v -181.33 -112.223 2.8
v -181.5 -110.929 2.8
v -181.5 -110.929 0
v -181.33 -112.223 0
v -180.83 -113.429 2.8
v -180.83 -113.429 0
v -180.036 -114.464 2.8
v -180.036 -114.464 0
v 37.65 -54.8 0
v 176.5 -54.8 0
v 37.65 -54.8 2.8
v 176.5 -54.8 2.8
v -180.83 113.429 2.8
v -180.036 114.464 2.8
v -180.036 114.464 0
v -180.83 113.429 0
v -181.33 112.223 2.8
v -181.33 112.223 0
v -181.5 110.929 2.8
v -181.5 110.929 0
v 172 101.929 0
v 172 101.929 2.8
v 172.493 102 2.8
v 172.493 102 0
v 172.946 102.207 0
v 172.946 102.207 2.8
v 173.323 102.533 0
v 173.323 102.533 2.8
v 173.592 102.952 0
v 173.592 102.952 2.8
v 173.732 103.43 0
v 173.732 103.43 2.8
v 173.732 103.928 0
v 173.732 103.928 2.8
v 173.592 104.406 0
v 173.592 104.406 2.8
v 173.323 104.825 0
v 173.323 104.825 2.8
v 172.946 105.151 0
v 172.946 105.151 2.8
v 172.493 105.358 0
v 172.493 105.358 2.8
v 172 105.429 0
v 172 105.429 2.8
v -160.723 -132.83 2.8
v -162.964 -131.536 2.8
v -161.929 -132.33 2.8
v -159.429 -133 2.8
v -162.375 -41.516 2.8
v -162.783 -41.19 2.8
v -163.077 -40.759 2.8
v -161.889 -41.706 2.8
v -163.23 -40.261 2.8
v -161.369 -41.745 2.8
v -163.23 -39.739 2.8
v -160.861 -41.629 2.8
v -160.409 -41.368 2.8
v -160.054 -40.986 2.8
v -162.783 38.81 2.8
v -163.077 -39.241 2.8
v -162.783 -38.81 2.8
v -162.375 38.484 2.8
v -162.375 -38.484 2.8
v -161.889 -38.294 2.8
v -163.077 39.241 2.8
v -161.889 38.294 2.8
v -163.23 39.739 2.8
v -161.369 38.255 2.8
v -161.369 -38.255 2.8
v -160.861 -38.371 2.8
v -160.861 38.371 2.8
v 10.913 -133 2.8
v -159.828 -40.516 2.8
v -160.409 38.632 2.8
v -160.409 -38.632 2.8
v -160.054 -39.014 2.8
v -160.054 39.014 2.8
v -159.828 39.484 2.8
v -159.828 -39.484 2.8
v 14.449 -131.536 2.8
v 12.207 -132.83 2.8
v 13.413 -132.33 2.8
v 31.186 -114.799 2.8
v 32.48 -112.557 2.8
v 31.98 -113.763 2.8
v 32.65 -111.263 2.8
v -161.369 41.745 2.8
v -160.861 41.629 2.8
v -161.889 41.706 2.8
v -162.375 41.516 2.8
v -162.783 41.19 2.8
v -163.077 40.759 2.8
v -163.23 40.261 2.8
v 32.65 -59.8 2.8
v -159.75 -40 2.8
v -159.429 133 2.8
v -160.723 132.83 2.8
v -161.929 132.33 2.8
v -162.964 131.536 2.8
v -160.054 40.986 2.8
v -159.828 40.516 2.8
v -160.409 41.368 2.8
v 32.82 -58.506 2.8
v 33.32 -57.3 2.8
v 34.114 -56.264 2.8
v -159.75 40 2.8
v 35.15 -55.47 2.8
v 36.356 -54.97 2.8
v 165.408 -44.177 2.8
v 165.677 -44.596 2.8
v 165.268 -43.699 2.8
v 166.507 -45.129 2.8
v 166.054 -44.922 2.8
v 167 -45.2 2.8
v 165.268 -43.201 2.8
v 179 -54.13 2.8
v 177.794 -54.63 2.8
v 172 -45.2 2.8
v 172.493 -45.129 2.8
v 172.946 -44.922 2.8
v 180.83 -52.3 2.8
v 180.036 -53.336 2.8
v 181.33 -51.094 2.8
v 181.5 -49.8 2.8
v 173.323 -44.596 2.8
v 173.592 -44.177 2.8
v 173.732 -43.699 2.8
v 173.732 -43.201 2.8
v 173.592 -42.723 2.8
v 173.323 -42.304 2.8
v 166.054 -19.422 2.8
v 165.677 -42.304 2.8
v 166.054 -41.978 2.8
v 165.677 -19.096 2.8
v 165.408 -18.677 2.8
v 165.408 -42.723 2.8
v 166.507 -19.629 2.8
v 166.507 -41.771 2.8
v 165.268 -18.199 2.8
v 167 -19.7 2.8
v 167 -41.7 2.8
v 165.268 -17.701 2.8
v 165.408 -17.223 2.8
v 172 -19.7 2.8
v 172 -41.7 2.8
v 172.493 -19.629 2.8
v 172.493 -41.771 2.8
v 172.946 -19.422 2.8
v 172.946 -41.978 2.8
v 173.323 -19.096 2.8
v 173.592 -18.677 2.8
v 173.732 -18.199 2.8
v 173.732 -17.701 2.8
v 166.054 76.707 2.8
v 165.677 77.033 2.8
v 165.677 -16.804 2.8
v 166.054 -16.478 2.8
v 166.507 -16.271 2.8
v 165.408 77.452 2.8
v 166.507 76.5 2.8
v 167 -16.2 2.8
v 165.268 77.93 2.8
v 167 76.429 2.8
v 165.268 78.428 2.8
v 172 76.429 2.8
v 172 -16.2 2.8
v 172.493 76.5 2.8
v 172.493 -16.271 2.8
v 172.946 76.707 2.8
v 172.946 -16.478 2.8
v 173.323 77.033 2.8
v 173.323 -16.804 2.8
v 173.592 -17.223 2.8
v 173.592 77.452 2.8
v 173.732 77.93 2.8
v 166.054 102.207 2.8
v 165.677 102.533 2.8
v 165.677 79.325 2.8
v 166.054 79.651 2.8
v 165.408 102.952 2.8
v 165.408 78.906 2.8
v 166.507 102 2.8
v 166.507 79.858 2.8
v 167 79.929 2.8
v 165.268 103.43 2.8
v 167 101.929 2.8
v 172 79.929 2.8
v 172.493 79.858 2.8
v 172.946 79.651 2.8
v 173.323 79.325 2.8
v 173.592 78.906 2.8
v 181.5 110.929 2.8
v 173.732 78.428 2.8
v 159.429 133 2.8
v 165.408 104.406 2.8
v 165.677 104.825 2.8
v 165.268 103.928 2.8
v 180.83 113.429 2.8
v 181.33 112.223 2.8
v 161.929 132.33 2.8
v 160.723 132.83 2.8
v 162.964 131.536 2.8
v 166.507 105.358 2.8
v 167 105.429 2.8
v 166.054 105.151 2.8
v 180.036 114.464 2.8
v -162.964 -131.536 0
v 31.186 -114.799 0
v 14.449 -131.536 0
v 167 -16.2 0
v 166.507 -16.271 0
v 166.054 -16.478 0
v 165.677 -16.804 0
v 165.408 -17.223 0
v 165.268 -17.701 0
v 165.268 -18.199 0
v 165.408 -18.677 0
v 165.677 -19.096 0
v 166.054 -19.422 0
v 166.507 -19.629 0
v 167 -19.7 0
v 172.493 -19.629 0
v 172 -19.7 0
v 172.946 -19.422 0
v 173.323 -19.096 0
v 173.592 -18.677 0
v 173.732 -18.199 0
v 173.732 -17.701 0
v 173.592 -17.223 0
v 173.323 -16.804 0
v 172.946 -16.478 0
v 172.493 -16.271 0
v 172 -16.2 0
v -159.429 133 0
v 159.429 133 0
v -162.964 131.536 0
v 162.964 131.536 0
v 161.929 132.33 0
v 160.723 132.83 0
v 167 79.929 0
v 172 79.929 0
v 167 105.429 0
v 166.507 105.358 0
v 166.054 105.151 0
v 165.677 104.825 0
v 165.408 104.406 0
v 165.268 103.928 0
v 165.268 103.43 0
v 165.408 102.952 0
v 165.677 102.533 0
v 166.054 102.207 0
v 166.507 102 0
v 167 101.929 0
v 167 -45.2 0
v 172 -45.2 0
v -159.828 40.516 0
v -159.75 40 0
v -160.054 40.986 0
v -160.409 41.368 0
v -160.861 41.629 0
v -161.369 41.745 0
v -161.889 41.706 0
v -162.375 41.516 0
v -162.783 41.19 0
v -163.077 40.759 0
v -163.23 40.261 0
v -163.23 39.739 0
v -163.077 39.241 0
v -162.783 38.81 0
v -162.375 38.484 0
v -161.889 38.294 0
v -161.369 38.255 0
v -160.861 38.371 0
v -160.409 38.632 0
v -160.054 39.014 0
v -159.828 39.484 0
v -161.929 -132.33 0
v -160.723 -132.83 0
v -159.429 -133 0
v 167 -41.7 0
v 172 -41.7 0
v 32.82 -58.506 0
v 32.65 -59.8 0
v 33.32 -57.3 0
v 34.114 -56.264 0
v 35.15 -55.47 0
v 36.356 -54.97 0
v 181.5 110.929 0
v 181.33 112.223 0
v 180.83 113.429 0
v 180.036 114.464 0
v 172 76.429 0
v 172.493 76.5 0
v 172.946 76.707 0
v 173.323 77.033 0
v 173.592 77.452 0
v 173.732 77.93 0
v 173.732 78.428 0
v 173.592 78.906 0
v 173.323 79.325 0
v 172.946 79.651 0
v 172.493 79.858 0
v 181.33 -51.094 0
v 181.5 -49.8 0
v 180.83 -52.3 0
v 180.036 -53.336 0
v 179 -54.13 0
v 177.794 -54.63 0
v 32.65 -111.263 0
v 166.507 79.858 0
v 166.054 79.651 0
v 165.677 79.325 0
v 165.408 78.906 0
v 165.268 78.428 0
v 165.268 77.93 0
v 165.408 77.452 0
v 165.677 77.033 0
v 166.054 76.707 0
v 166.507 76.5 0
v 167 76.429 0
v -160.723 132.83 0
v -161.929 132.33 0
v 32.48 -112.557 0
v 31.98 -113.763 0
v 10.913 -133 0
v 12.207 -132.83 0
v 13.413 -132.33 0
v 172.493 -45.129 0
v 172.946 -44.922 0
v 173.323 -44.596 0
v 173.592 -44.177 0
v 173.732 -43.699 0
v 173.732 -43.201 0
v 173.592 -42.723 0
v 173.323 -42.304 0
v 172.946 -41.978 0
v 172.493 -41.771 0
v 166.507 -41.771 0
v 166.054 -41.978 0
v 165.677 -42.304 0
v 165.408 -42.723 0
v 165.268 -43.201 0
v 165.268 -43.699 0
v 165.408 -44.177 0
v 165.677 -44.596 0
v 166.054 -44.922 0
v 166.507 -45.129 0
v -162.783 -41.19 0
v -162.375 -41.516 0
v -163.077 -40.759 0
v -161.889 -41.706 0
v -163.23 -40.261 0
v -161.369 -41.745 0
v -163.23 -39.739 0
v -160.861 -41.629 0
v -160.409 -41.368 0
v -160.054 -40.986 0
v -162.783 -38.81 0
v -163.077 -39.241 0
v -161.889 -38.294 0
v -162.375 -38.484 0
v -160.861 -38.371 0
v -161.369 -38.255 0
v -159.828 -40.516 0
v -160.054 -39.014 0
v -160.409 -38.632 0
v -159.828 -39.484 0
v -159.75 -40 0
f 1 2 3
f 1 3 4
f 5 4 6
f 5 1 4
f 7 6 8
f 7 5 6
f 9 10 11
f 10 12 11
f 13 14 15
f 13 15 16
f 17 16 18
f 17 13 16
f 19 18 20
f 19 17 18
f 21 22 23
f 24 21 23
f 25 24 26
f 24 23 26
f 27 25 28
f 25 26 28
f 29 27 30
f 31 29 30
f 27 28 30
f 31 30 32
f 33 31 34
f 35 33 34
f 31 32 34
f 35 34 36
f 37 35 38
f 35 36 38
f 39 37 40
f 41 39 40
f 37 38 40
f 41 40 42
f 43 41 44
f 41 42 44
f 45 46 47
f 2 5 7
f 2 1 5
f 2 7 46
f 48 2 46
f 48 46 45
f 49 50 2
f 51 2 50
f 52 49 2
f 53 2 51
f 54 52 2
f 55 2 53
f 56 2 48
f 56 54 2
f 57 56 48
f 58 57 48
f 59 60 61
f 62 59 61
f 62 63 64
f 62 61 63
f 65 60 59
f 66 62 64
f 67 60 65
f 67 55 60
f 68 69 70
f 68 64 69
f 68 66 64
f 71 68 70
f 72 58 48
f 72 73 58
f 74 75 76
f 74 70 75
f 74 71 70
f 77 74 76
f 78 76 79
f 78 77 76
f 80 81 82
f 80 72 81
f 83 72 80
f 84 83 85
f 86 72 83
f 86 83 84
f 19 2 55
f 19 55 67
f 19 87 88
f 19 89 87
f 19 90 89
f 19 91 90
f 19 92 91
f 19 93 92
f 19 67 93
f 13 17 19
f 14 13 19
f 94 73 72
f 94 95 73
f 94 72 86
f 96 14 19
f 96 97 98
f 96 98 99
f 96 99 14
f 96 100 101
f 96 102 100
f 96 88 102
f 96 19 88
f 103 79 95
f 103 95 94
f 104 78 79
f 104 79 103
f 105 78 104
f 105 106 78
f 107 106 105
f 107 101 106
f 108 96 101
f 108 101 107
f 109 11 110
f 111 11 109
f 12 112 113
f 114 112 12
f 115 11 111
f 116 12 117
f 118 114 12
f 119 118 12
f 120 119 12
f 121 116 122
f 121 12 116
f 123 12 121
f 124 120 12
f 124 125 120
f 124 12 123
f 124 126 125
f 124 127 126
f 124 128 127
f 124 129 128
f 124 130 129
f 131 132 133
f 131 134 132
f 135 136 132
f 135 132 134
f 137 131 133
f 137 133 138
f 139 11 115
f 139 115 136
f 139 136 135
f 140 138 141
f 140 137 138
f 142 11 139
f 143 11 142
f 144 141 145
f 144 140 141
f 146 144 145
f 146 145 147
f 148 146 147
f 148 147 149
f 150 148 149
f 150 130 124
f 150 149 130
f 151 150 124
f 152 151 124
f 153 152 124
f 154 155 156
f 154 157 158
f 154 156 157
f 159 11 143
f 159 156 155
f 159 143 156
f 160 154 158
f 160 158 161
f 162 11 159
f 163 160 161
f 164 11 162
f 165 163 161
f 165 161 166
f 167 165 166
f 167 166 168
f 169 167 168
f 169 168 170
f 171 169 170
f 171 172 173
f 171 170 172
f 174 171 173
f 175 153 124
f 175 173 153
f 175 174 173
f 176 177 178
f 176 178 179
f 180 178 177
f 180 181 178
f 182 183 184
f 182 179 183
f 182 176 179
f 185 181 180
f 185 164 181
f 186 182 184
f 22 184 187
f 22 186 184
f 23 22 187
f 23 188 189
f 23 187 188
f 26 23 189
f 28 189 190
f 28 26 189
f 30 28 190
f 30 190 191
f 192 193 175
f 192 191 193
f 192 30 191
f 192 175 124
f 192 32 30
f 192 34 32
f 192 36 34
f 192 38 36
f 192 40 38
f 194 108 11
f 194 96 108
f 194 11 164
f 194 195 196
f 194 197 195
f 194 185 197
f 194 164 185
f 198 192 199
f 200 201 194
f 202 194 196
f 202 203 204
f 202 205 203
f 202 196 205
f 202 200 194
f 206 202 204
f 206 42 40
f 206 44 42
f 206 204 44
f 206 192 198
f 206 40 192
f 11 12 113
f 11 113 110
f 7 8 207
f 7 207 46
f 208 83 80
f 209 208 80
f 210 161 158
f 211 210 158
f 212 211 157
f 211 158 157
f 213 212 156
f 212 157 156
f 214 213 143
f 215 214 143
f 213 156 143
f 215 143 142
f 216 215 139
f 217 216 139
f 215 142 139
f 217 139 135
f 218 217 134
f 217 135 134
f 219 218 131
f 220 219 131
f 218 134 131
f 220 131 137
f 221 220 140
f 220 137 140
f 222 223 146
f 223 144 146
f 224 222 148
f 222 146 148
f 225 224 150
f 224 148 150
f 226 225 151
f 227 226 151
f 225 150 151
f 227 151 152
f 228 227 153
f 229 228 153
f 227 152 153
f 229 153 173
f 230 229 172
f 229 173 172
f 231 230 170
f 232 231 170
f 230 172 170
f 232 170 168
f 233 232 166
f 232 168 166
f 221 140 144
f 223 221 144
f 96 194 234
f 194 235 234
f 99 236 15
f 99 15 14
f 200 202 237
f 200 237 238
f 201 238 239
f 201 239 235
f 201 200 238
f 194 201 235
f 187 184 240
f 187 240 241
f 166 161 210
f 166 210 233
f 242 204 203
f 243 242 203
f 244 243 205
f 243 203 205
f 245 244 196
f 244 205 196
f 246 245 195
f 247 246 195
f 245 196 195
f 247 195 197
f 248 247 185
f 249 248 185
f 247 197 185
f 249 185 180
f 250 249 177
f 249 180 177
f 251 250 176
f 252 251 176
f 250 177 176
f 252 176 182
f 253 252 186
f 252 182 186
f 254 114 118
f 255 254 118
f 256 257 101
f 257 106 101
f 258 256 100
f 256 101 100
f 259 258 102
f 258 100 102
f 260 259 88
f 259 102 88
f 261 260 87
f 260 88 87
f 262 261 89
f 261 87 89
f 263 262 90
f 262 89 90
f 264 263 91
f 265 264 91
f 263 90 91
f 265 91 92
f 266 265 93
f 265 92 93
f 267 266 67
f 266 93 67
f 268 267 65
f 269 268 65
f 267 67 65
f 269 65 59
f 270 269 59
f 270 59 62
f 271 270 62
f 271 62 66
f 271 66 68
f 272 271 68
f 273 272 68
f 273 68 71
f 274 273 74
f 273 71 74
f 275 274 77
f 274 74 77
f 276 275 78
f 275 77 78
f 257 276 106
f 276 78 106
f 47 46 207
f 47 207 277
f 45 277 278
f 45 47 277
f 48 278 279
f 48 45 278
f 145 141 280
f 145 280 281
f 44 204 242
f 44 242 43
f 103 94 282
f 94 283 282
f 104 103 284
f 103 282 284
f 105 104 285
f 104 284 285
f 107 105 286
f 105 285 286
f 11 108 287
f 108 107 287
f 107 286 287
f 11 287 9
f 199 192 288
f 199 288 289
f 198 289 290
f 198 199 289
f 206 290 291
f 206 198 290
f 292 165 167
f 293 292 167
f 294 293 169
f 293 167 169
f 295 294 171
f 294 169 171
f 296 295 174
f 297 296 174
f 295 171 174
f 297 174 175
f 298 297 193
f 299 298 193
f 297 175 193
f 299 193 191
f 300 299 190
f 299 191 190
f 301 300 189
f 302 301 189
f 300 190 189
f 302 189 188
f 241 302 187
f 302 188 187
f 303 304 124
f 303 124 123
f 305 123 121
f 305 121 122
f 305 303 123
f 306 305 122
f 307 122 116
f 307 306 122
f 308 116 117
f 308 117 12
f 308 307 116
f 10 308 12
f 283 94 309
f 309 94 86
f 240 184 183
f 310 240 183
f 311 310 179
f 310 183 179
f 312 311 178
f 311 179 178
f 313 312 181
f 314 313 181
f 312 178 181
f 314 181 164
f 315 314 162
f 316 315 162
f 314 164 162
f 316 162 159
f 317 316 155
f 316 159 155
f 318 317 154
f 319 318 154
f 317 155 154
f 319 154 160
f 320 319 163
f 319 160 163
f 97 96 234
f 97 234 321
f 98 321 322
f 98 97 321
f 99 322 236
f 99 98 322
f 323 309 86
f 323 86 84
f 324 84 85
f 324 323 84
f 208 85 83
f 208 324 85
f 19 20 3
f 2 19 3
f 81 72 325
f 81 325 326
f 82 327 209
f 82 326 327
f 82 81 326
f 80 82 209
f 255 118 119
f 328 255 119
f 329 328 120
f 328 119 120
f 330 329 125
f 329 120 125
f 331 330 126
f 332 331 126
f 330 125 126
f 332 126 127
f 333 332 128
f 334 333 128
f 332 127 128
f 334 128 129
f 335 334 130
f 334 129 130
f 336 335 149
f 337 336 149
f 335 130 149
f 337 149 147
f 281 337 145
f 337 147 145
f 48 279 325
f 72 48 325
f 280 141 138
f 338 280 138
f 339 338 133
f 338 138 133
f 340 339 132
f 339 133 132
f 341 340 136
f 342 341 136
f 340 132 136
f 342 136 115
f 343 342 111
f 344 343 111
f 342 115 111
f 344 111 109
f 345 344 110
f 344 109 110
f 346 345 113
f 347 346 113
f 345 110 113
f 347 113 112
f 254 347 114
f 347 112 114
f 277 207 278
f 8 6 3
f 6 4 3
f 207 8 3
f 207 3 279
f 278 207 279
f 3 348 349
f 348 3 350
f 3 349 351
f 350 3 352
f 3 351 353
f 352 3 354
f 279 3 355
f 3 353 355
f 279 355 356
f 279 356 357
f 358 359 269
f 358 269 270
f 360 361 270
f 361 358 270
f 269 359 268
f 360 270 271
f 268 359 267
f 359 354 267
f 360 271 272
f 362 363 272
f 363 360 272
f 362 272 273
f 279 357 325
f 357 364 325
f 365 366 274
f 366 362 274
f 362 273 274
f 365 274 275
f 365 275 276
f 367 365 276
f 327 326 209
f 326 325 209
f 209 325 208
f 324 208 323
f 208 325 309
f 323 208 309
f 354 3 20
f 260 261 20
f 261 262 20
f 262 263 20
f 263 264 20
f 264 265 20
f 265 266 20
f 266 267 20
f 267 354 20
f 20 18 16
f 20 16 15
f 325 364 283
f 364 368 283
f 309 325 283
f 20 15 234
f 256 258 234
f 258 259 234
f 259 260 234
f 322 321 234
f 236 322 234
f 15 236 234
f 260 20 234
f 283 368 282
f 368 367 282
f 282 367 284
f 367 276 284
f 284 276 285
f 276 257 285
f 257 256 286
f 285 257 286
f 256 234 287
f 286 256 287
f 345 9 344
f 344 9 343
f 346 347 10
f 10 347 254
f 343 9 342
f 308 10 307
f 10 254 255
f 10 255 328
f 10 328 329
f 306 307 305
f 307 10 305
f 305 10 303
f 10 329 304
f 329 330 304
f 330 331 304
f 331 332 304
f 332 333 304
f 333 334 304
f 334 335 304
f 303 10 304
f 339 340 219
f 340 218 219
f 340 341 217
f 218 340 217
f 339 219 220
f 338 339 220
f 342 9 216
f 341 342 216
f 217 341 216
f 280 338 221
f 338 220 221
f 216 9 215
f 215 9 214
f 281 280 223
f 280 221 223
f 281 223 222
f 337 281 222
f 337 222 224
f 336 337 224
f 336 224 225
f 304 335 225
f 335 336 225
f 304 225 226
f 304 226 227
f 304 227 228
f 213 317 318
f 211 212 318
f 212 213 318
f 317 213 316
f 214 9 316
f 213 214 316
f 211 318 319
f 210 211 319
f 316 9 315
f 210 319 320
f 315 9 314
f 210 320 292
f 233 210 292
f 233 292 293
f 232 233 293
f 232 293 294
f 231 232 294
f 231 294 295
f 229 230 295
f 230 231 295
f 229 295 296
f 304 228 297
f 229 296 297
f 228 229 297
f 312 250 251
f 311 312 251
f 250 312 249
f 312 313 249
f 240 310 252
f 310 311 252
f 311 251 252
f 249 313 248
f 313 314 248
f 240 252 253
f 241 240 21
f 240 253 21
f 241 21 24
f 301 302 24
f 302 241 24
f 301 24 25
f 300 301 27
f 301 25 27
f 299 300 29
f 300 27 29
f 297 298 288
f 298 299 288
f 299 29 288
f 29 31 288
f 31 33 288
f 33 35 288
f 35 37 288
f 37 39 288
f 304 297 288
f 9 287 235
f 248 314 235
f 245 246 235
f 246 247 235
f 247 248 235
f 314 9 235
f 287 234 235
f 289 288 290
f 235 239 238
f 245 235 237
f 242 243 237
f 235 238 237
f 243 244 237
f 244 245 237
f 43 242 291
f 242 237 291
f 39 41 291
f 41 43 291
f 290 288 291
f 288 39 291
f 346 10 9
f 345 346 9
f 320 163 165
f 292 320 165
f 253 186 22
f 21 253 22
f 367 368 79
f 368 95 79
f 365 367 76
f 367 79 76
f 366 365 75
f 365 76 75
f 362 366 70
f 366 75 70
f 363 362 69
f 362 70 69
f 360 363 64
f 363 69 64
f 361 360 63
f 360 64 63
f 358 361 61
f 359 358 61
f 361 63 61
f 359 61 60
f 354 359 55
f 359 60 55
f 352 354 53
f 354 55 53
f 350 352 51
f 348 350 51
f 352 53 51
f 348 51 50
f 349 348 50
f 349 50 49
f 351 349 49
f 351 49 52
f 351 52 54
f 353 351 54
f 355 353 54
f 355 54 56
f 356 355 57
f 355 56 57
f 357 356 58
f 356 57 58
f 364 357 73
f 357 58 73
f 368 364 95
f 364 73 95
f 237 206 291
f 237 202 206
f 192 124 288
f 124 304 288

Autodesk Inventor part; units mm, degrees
ref_plane "YZ Plane" through (0, 0, 0) normal (1, 0, 0) x (0, 1, 0)
ref_plane "XZ Plane" through (0, 0, 0) normal (0, 1, 0) x (-1, 0, 0)
ref_plane "XY Plane" through (0, 0, 0) normal (0, 0, 1) x (1, 0, 0)
sketch "TFT LCD Touch Screen" plane through (0, 0, 0) normal (0, 0, 1) x (1, 0, 0)
  line L0 (-55, 32.5) -> (55, 32.5)
  line L1 (55, 32.5) -> (55, -32.5)
  line L2 (55, -32.5) -> (-55, -32.5)
  line L3 (-55, -32.5) -> (-55, 32.5)
  circle A0 centre (-51, 28.5) radius 1.5
  circle A1 centre (-51, -28.5) radius 1.5
  circle A2 centre (51, -28.5) radius 1.5
  circle A3 centre (51, 28.5) radius 1.5
  line L4 (-40, 29) -> (40, 29)
  line L5 (40, 29) -> (40, -29)
  line L6 (40, -29) -> (-40, -29)
  line L7 (-40, -29) -> (-40, 29)
  point P0 (0.75, 3.075)
  point P1 (0, 32.5)
  point P2 (55, 0)
  point P3 (0, 29)
  point P4 (-40, 0)
  dimension "d9" = 110
  dimension "d10" = 65
  dimension "d11" = 3
  dimension "d12" = 57
  dimension "d13" = 102
  dimension "d14" = 4
  dimension "d15" = 4
  dimension "d16" = 80
  dimension "d17" = 58
sketch "Hinges Screw Holes" plane through (0, 0, 0) normal (0, 0, 1) x (1, 0, 0)
  arc A0 (172, 94.429) -> (172, 97.929) centre (172, 96.179) ccw
  arc A1 (172, 68.929) -> (172, 72.429) centre (172, 70.679) ccw
  arc A2 (172, -27.2) -> (172, -23.7) centre (172, -25.45) ccw
  arc A3 (172, -52.7) -> (172, -49.2) centre (172, -50.95) ccw
  arc A4 (167, 97.929) -> (167, 94.429) centre (167, 96.179) ccw
  arc A5 (167, 72.429) -> (167, 68.929) centre (167, 70.679) ccw
  arc A6 (167, -23.7) -> (167, -27.2) centre (167, -25.45) ccw
  arc A7 (167, -49.2) -> (167, -52.7) centre (167, -50.95) ccw
  line L0 (167, 97.929) -> (172, 97.929)
  line L1 (167, 94.429) -> (172, 94.429)
  line L2 (167, 72.429) -> (172, 72.429)
  line L3 (167, 68.929) -> (172, 68.929)
  line L4 (167, -23.7) -> (172, -23.7)
  line L5 (167, -27.2) -> (172, -27.2)
  line L6 (167, -49.2) -> (172, -49.2)
  line L7 (167, -52.7) -> (172, -52.7)
  point P0 (169.5, 0)
  point P1 (0, -7.5)
  dimension "d47" = 3.5
  dimension "d48" = 3.5
  dimension "d50" = 25.5
  dimension "d51" = 3.5
  dimension "d52" = 3.5
  dimension "d53" = 25.5
  dimension "d58" = 3.5
  dimension "d59" = 3.5
  dimension "d60" = 25.5
  dimension "d61" = 3.5
  dimension "d62" = 3.5
  dimension "d63" = 25.5
  dimension "d65" = 5
  dimension "d70" = 78.179
  dimension "d71" = 17.95
sketch "Door Shape" plane through (0, 0, 0) normal (0, 0, 1) x (1, 0, 0)
  line L0 (182, -55.7) -> (182, 113)
  line L1 (182, 113) -> (162, 133)
  line L2 (162, 133) -> (-162, 133)
  line L3 (-162, 133) -> (-182, 113)
  line L4 (-182, 113) -> (-182, -114)
  line L5 (-182, -114) -> (-162, -134)
  line L6 (-162, -134) -> (13.05, -134)
  line L7 (13.05, -134) -> (33.05, -114)
  line L8 (33.05, -114) -> (33.05, -55.7)
  line L9 (33.05, -55.7) -> (182, -55.7)
  line L10 (-161.8343, 132.6) -> (161.8343, 132.6)
  line L11 (161.8343, 132.6) -> (181.6, 112.8343)
  line L12 (181.6, 112.8343) -> (181.6, -55.3)
  line L13 (181.6, -55.3) -> (32.65, -55.3)
  line L14 (32.65, -55.3) -> (32.65, -113.8343)
  line L15 (32.65, -113.8343) -> (12.8843, -133.6)
  line L16 (12.8843, -133.6) -> (-161.8343, -133.6)
  line L17 (-161.8343, -133.6) -> (-181.6, -113.8343)
  line L18 (-181.6, -113.8343) -> (-181.6, 112.8343)
  line L19 (-181.6, 112.8343) -> (-161.8343, 132.6)
  line L20 (12.8843, -133.6) -> (181.6, -133.6)
  line L21 (181.6, -133.6) -> (181.6, -55.3)
  point P0 (-8.285, -11.54)
  dimension "d79" = 0.4
sketch "Sketch1" plane through (0, 0, 0) normal (0, 0, 1) x (1, 0, 0)
  line L0 (-182, 133.5) -> (182, 133.5)
  line L1 (182, 133.5) -> (182, -133.5)
  line L2 (182, -133.5) -> (-182, -133.5)
  line L3 (-182, -133.5) -> (-182, 133.5)
  line L4 (181.5, 133) -> (-181.5, 133)
  line L5 (-181.5, 133) -> (-181.5, -133)
  line L6 (-181.5, -133) -> (181.5, -133)
  line L7 (181.5, -133) -> (181.5, 133)
  point P0 (0, 0)
  point P1 (0, 133.5)
  point P2 (-181.5, 0)
  dimension "d0" = 364
  dimension "d1" = 267
  dimension "d4" = 0.5
extrude "Extrusion1" add sketch "Sketch1" along normal blind 2.8 contours L7 L6 L5 L4
chamfer "Chamfer1" distance 20 angle 45 4 edges at (-181.5, -133, 1.4) (-181.5, 133, 1.4) (181.5, -133, 1.4) (181.5, 133, 1.4)
fillet "Fillet1" radius 5 8 edges at (-161.5, -133, 1.4) (161.5, -133, 1.4) (181.5, -113, 1.4) (181.5, 113, 1.4) (161.5, 133, 1.4) (-161.5, 133, 1.4) (-181.5, 113, 1.4) (-181.5, -113, 1.4)
sketch "Sketch6" plane through (0, 0, 2.8) normal (0, 0, 1) x (1, 0, 0)
  line L0 (181.5, -110.9289) -> (181.5, 110.9289) projected
  arc A0 (172, 101.929) -> (172, 105.429) centre (172, 103.679) ccw
  arc A1 (172, 76.429) -> (172, 79.929) centre (172, 78.179) ccw
  arc A2 (172, -19.7) -> (172, -16.2) centre (172, -17.95) ccw
  arc A3 (172, -45.2) -> (172, -41.7) centre (172, -43.45) ccw
  arc A4 (167, 105.429) -> (167, 101.929) centre (167, 103.679) ccw
  arc A5 (167, 79.929) -> (167, 76.429) centre (167, 78.179) ccw
  arc A6 (167, -16.2) -> (167, -19.7) centre (167, -17.95) ccw
  arc A7 (167, -41.7) -> (167, -45.2) centre (167, -43.45) ccw
  line L1 (167, 105.429) -> (172, 105.429)
  line L2 (167, 101.929) -> (172, 101.929)
  line L3 (167, 79.929) -> (172, 79.929)
  line L4 (167, 76.429) -> (172, 76.429)
  line L5 (167, -16.2) -> (172, -16.2)
  line L6 (167, -19.7) -> (172, -19.7)
  line L7 (167, -41.7) -> (172, -41.7)
  line L8 (167, -45.2) -> (172, -45.2)
  point P0 (0, 0)
  dimension "d68" = 9.5
  dimension "d69" = 9.5
  dimension "d72" = 78.179
extrude "Extrusion5" cut sketch "Sketch6" against normal blind 10
sketch "Sketch7" plane through (0, 0, 2.8) normal (0, 0, 1) x (1, 0, 0)
  circle A0 centre (-161.5, 40) radius 1.75
  circle A1 centre (-161.5, -40) radius 1.75
  line L0 (-181.5, 110.9289) -> (-181.5, -110.9289) projected
  point P0 (0, 0)
  dimension "d73" = 3.5
  dimension "d74" = 80
  dimension "d75" = 40
  dimension "d76" = 20
extrude "Extrusion6" cut sketch "Sketch7" against normal blind 18.5
sketch "Sketch8" plane through (0, 0, 2.8) normal (0, 0, 1) x (1, 0, 0)
  line L0 (-181.5, 110.9289) -> (-181.5, -110.9289) projected
  line L1 (159.4289, 133) -> (-159.4289, 133) projected
  line L2 (182, -55.2) -> (182, 113.5)
  line L3 (182, 113.5) -> (162, 133.5)
  line L4 (162, 133.5) -> (-162, 133.5)
  line L5 (-162, 133.5) -> (-182, 113.5)
  line L6 (-182, 113.5) -> (-182, -113.5)
  line L7 (-182, -113.5) -> (-162, -133.5)
  line L8 (-162, -133.5) -> (13.05, -133.5)
  line L9 (13.05, -133.5) -> (33.05, -113.5)
  line L10 (33.05, -113.5) -> (33.05, -55.2)
  line L11 (33.05, -55.2) -> (182, -55.2)
  line L12 (-161.8343, 133.1) -> (161.8343, 133.1)
  line L13 (161.8343, 133.1) -> (181.6, 113.3343)
  line L14 (181.6, 113.3343) -> (181.6, -54.8)
  line L15 (181.6, -54.8) -> (32.65, -54.8)
  line L16 (32.65, -54.8) -> (32.65, -113.3343)
  line L17 (32.65, -113.3343) -> (12.8843, -133.1)
  line L18 (12.8843, -133.1) -> (-161.8343, -133.1)
  line L19 (-161.8343, -133.1) -> (-181.6, -113.3343)
  line L20 (-181.6, -113.3343) -> (-181.6, 113.3343)
  line L21 (-181.6, 113.3343) -> (-161.8343, 133.1)
  line L22 (12.8843, -133.1) -> (181.6, -133.1)
  line L23 (181.6, -133.1) -> (181.6, -54.8)
  point P0 (0, 0)
  point P1 (-182, 0)
  point P2 (-181.5, 0)
  point P3 (0, 133)
  point P4 (0, 133.5)
extrude "Extrusion7" cut sketch "Sketch8" against normal blind 18.5 contours L23 L22 L9 L10 L11 | L11 L10 L9 L22 L17 L16 L15 L23
fillet "Fillet3" radius 5 4 edges at (12.9843, -133, 1.4) (32.65, -113.3343, 1.4) (32.65, -54.8, 1.4) (181.5, -54.8, 1.4)
equation "\"d75\" = 0.5 * d74"
equation "\"d14\" = -0.5 * d12 + 0.5 * d10"
equation "\"d15\" = -0.5 * d13 + 0.5 * d9"
properties part number "Clear Front Door 2" material "Glass"
